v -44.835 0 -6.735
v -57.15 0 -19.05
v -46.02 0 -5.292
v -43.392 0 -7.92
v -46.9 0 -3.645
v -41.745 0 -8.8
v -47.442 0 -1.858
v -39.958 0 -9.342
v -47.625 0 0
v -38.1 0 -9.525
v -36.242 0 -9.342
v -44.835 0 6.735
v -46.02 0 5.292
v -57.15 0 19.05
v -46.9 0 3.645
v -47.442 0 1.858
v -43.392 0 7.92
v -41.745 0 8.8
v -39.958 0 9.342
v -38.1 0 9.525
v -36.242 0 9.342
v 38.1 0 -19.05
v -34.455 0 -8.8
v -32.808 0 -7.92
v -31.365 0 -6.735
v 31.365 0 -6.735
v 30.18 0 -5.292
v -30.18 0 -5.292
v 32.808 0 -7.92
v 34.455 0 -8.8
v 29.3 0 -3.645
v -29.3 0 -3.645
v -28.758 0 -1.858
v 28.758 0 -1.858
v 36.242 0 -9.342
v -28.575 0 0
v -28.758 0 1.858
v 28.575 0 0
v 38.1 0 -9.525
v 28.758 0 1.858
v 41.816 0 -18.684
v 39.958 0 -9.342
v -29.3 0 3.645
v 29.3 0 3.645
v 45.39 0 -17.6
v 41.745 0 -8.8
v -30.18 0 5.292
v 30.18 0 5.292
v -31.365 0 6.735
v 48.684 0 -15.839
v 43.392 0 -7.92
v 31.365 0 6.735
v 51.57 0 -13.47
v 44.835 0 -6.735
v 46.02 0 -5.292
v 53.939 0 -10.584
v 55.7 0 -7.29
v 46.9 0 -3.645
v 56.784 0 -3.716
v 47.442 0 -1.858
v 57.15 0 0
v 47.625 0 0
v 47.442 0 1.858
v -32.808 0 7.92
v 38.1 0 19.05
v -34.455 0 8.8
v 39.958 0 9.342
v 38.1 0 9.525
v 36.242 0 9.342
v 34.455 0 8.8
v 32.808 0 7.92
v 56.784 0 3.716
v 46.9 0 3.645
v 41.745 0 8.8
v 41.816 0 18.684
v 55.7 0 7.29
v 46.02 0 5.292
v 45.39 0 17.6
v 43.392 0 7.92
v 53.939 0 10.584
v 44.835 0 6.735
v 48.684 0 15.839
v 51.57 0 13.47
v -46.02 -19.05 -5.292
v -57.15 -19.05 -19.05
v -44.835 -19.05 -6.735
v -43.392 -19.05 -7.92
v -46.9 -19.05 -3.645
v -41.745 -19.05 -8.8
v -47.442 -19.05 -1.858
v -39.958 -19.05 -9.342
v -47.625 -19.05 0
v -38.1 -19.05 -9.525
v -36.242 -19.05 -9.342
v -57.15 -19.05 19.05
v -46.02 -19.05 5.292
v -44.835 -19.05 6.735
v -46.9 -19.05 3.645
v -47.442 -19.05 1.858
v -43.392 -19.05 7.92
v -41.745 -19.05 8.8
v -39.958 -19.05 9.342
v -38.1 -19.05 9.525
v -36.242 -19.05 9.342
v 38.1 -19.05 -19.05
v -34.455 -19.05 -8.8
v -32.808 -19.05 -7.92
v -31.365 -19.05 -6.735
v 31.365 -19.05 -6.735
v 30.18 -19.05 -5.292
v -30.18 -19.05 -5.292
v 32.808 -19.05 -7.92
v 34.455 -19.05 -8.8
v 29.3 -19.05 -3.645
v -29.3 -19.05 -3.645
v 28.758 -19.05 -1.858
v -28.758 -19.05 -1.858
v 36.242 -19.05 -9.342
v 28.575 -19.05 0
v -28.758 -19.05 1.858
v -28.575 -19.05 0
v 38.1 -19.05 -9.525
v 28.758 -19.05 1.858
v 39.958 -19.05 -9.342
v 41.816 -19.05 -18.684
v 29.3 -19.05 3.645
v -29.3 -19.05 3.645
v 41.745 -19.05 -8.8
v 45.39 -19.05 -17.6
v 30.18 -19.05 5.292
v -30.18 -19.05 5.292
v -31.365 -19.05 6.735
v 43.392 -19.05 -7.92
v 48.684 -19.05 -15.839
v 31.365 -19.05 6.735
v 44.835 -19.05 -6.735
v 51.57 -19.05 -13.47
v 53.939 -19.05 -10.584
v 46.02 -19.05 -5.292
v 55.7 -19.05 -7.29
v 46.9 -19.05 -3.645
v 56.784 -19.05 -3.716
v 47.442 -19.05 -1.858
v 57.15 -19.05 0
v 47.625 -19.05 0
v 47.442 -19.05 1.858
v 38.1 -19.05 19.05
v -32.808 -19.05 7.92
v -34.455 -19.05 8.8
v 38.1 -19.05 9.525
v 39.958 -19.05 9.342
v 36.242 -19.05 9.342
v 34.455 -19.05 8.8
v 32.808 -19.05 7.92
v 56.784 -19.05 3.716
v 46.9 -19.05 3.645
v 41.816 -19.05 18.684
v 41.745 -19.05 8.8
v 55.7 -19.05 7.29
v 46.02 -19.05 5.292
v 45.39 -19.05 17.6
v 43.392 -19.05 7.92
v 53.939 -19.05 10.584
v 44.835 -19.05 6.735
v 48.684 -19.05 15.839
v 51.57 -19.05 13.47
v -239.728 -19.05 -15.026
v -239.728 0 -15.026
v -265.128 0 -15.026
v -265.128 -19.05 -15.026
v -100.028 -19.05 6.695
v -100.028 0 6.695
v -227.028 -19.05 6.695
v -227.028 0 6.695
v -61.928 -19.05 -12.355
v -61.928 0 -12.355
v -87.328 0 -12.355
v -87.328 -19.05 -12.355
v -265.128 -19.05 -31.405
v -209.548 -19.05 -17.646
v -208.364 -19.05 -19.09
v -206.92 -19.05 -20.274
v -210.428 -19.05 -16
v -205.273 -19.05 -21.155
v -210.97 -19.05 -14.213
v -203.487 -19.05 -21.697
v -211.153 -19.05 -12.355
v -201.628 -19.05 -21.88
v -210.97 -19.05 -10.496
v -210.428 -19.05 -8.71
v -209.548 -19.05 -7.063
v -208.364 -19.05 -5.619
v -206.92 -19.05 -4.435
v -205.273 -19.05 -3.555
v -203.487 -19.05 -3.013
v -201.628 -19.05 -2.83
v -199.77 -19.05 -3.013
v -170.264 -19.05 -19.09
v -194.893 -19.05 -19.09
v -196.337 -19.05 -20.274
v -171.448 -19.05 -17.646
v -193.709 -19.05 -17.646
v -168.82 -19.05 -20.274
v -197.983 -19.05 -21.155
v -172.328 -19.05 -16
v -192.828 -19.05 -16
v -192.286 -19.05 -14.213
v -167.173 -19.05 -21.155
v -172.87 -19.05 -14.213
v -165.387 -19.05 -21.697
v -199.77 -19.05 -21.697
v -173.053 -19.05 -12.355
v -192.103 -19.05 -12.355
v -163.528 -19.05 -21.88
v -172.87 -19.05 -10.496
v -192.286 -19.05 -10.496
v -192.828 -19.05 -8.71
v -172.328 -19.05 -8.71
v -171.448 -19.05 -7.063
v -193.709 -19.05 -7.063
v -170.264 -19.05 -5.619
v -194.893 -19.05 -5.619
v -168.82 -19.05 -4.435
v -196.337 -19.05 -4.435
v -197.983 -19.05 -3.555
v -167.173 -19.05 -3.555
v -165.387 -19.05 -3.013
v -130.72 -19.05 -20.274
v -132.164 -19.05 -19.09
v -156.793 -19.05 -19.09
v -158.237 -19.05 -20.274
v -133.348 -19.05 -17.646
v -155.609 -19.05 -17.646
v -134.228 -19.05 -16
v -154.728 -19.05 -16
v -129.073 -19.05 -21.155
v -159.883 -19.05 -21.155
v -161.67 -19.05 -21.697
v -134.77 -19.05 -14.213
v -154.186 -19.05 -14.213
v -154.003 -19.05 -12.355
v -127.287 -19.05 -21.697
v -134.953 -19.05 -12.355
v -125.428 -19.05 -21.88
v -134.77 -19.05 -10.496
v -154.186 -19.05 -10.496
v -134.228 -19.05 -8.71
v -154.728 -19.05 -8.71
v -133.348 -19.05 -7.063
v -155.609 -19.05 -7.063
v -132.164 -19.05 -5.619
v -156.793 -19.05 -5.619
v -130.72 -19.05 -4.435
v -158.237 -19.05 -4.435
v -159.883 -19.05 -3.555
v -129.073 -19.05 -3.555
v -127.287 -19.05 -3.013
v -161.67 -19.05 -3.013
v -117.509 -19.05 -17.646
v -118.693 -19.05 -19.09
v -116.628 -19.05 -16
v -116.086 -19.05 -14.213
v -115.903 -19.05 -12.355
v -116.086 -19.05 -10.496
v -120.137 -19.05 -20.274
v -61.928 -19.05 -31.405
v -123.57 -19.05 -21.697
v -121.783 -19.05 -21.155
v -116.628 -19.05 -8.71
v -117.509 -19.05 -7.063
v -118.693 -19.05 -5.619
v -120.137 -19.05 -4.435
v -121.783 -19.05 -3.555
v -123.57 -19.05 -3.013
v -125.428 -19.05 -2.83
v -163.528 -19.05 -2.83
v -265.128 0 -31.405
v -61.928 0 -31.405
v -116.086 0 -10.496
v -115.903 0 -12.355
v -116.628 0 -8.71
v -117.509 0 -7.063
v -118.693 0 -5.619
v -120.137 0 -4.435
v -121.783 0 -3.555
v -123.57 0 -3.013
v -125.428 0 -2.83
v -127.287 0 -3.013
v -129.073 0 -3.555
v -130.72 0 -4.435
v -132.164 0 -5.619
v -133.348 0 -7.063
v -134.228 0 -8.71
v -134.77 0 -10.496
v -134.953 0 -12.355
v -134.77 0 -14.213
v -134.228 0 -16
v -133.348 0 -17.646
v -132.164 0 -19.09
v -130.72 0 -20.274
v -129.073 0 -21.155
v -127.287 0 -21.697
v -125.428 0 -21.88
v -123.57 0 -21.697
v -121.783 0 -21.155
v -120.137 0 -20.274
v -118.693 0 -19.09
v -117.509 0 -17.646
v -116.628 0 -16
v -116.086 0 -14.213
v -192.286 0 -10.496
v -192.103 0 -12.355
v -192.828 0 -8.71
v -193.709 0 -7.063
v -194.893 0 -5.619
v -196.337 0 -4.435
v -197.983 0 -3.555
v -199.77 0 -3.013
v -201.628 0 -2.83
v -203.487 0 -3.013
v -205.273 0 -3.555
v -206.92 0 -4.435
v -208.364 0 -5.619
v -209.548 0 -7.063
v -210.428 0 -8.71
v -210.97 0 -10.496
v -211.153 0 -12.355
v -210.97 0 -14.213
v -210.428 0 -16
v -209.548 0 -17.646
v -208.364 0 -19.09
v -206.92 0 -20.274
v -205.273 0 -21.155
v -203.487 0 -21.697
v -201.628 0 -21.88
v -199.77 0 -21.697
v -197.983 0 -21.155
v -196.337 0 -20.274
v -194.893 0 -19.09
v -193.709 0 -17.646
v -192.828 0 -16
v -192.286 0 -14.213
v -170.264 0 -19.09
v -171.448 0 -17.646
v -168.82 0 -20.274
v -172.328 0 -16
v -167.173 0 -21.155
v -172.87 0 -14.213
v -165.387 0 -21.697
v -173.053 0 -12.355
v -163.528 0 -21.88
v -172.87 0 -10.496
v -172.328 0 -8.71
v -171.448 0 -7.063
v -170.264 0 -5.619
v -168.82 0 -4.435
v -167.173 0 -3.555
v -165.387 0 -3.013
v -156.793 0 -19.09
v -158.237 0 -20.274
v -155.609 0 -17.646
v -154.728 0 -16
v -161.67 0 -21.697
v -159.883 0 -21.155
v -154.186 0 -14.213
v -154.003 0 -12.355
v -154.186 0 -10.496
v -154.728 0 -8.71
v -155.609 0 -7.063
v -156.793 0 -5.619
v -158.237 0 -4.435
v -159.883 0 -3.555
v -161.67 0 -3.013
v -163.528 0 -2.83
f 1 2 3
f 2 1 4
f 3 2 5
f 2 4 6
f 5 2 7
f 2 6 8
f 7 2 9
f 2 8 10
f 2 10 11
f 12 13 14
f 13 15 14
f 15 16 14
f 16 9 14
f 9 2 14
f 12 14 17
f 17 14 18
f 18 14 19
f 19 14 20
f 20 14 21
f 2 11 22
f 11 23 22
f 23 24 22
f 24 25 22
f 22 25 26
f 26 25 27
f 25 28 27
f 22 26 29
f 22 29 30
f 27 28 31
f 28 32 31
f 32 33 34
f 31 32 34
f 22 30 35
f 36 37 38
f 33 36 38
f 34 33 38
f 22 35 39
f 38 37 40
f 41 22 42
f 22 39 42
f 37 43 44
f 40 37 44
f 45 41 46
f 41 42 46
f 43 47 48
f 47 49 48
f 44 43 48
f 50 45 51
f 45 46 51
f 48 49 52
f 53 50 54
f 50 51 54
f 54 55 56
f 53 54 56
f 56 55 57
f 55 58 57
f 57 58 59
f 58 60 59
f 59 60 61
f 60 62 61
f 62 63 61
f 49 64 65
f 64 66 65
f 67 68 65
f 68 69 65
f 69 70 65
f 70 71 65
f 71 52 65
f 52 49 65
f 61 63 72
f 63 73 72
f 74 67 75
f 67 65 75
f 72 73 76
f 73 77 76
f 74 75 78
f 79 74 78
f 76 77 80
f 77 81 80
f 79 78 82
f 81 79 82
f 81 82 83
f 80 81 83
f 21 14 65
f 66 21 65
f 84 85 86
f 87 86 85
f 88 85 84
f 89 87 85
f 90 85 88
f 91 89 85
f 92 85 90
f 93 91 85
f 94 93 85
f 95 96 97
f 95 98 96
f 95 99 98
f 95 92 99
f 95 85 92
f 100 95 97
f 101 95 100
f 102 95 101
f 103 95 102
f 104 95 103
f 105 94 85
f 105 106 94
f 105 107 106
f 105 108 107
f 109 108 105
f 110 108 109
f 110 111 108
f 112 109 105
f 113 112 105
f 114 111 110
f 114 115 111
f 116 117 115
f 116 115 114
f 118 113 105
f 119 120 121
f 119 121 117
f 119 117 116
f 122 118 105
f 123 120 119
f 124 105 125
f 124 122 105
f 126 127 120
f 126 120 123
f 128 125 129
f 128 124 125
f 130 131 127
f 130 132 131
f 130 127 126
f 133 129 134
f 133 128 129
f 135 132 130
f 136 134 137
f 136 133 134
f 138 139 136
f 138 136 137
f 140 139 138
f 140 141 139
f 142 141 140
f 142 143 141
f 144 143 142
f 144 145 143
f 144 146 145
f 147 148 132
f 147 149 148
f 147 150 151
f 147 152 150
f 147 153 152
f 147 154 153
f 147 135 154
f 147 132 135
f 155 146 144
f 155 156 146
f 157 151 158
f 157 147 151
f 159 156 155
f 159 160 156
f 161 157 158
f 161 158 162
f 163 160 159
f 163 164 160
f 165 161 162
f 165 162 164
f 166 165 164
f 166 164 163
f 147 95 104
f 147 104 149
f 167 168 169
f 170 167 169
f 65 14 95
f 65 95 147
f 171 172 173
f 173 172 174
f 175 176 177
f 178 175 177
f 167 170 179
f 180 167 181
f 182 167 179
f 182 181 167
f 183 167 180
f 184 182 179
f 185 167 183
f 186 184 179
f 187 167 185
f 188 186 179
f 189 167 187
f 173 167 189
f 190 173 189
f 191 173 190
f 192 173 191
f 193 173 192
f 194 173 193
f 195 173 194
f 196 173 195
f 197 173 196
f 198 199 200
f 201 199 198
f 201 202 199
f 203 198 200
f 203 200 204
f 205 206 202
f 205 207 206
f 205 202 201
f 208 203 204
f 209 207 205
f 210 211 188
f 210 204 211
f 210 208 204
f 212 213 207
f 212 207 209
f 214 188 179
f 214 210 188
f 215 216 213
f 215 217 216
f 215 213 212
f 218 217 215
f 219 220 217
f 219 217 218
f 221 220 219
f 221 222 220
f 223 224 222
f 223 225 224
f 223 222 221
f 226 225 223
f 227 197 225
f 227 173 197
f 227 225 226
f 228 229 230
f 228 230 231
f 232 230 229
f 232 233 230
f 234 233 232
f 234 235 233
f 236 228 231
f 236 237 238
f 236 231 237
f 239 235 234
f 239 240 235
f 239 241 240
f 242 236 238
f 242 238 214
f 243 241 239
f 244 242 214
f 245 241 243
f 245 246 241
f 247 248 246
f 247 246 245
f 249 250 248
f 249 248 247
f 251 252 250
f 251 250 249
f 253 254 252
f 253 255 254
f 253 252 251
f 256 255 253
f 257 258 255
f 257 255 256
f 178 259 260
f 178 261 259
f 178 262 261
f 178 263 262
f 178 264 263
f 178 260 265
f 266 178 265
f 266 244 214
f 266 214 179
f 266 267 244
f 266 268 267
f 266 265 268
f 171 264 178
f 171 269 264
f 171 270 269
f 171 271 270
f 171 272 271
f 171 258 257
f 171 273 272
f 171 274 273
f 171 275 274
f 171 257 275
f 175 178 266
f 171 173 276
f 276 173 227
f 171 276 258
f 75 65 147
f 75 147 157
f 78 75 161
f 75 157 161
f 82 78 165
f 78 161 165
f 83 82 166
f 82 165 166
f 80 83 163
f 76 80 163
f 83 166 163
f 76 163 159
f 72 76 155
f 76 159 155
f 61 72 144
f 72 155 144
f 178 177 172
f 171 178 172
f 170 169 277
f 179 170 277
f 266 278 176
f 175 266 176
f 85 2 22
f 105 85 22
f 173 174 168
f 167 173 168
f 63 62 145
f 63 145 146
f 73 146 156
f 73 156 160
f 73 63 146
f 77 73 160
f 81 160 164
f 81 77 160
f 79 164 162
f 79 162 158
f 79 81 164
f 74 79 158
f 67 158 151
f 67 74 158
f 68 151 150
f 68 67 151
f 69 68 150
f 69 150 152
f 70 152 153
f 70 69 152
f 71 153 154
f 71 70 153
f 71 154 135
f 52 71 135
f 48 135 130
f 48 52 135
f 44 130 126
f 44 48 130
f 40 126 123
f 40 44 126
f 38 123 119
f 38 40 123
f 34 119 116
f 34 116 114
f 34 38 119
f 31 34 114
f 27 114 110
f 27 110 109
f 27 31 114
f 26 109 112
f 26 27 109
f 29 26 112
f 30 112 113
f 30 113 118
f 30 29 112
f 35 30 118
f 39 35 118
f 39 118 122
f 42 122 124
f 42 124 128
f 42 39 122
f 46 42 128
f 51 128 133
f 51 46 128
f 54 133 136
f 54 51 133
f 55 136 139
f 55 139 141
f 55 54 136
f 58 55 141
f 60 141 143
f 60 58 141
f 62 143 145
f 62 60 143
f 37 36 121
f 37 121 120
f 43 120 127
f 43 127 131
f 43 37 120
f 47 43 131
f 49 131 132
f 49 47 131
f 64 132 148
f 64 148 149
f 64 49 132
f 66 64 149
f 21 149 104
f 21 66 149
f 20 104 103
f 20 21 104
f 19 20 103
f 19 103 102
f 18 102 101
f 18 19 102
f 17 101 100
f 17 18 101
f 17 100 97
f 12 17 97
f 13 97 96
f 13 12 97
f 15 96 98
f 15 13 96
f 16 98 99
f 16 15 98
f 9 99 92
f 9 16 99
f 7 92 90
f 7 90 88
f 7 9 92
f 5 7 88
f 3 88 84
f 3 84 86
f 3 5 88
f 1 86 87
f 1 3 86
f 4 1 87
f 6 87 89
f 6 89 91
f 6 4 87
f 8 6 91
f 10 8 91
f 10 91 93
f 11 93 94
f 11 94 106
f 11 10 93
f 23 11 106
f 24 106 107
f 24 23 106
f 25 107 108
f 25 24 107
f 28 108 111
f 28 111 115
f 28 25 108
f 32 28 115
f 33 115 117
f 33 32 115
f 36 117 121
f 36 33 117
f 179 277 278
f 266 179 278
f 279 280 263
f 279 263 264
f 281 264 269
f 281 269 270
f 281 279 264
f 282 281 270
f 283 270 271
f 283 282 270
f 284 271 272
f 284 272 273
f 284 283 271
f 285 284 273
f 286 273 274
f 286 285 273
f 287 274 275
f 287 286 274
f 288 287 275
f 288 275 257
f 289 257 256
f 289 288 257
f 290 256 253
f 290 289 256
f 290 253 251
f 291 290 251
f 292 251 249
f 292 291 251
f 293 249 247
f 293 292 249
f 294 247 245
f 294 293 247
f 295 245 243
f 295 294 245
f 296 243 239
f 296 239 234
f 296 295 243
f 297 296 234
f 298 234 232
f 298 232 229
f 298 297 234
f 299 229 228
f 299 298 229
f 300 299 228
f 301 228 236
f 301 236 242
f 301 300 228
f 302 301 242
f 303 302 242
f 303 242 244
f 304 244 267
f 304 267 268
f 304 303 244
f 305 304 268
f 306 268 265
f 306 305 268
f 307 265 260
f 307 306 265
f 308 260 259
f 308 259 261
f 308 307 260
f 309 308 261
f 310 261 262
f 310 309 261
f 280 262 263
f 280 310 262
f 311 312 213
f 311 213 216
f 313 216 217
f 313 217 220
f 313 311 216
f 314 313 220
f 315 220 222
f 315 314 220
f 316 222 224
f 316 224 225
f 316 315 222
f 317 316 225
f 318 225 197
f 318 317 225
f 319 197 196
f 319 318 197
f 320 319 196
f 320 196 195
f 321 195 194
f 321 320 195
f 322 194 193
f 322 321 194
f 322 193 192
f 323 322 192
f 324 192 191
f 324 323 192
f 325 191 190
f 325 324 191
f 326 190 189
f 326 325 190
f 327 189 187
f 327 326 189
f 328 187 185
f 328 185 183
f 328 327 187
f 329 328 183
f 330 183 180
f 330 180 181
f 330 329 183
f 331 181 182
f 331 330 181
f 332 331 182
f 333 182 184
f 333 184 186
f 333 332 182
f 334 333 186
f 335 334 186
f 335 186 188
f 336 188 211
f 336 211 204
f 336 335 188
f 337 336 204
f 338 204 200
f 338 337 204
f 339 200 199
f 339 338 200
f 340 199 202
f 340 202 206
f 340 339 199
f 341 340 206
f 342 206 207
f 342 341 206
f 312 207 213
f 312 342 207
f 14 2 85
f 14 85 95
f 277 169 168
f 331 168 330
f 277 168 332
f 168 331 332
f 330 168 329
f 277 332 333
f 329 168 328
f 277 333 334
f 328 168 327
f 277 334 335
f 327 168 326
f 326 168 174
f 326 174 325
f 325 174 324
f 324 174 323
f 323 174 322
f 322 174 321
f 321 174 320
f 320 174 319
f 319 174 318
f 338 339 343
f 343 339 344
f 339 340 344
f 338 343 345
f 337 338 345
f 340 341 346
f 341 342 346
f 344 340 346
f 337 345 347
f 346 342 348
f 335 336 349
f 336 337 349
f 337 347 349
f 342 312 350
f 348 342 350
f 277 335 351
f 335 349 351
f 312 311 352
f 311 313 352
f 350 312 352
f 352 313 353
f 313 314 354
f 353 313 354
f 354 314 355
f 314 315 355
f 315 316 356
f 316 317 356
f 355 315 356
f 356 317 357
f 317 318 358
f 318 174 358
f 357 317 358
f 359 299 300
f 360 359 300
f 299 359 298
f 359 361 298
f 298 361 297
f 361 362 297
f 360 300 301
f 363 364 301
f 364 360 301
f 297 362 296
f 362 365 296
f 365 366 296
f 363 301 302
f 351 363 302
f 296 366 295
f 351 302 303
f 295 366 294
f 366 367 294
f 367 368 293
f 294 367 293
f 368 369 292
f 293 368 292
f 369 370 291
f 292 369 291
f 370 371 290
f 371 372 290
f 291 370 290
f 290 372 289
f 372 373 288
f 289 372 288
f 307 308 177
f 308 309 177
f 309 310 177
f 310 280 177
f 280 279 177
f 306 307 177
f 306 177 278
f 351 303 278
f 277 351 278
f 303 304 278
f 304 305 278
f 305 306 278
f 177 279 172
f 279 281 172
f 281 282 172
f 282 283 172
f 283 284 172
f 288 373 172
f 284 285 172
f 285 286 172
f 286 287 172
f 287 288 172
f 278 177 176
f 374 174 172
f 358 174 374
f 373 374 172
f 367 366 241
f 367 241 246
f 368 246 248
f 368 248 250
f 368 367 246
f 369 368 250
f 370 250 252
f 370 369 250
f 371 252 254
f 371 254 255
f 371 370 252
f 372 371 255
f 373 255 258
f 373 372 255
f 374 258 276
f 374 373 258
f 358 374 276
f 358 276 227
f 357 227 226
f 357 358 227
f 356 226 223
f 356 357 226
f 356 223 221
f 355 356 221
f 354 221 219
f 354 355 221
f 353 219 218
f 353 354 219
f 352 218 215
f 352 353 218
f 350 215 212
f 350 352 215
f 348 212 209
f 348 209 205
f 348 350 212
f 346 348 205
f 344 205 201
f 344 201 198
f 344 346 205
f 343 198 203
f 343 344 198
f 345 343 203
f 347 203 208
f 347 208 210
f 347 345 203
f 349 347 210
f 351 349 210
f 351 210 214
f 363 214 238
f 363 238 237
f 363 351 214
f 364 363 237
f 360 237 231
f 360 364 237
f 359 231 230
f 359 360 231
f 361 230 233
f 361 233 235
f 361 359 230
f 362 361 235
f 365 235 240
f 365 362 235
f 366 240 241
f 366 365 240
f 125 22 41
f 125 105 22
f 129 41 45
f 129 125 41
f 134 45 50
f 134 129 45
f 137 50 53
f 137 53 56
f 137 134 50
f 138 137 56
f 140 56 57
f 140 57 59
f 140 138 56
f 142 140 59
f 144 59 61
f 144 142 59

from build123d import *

# Parameters (mm, degrees)
F0_W     = 114.3
F0_H     = 38.1
F0_R     = 9.525
F1_DEPTH = 19.05
F2_R     = 19.04999
F3_R     = 9.525
F4_DEPTH = 19.05


# Not quite as in the source:
# - a fillet or chamfer is up to 0.001 mm smaller than in the source, because OpenCascade refuses the exact size


with BuildPart() as f1:
    # F0 (on Front) → F1 (new body)
    with BuildSketch(Plane.XZ):
        Rectangle(F0_W, F0_H)
        with Locations((-38.1, 0)):
            Circle(F0_R, mode=Mode.SUBTRACT)
        with Locations((38.1, 0)):
            Circle(F0_R, mode=Mode.SUBTRACT)
    extrude(amount=F1_DEPTH)

    # F2 (radius 19.05 in the source; OpenCascade refuses exactly that, so slightly less here)
    f2_edges = [f1.edges().sort_by_distance(p)[0] for p in [
        (57.15, -9.525, 19.05),
        (57.15, -9.525, -19.05),
    ]]
    fillet(f2_edges, radius=F2_R)


with BuildPart() as f4:
    # F3 (on Front) → F4 (new body)
    with BuildSketch(Plane.XZ):
        Polygon((-100.0284222552, 6.6953860101), (-227.0284222552, 6.6953860101), (-239.7284222552, -15.025992686), (-265.1284222552, -15.025992686), (-265.1284222552, -31.4046139899), (-61.9284222552, -31.4046139899), (-61.9284222552, -12.3546139899), (-87.3284222552, -12.3546139899), align=None)
        with Locations((-201.6284222552, -12.3546139899)):
            Circle(F3_R, mode=Mode.SUBTRACT)
        with Locations((-163.5284222552, -12.3546139899)):
            Circle(F3_R, mode=Mode.SUBTRACT)
        with Locations((-125.4284222552, -12.3546139899)):
            Circle(F3_R, mode=Mode.SUBTRACT)
    extrude(amount=F4_DEPTH)


solid = Compound([f1.part, f4.part])
